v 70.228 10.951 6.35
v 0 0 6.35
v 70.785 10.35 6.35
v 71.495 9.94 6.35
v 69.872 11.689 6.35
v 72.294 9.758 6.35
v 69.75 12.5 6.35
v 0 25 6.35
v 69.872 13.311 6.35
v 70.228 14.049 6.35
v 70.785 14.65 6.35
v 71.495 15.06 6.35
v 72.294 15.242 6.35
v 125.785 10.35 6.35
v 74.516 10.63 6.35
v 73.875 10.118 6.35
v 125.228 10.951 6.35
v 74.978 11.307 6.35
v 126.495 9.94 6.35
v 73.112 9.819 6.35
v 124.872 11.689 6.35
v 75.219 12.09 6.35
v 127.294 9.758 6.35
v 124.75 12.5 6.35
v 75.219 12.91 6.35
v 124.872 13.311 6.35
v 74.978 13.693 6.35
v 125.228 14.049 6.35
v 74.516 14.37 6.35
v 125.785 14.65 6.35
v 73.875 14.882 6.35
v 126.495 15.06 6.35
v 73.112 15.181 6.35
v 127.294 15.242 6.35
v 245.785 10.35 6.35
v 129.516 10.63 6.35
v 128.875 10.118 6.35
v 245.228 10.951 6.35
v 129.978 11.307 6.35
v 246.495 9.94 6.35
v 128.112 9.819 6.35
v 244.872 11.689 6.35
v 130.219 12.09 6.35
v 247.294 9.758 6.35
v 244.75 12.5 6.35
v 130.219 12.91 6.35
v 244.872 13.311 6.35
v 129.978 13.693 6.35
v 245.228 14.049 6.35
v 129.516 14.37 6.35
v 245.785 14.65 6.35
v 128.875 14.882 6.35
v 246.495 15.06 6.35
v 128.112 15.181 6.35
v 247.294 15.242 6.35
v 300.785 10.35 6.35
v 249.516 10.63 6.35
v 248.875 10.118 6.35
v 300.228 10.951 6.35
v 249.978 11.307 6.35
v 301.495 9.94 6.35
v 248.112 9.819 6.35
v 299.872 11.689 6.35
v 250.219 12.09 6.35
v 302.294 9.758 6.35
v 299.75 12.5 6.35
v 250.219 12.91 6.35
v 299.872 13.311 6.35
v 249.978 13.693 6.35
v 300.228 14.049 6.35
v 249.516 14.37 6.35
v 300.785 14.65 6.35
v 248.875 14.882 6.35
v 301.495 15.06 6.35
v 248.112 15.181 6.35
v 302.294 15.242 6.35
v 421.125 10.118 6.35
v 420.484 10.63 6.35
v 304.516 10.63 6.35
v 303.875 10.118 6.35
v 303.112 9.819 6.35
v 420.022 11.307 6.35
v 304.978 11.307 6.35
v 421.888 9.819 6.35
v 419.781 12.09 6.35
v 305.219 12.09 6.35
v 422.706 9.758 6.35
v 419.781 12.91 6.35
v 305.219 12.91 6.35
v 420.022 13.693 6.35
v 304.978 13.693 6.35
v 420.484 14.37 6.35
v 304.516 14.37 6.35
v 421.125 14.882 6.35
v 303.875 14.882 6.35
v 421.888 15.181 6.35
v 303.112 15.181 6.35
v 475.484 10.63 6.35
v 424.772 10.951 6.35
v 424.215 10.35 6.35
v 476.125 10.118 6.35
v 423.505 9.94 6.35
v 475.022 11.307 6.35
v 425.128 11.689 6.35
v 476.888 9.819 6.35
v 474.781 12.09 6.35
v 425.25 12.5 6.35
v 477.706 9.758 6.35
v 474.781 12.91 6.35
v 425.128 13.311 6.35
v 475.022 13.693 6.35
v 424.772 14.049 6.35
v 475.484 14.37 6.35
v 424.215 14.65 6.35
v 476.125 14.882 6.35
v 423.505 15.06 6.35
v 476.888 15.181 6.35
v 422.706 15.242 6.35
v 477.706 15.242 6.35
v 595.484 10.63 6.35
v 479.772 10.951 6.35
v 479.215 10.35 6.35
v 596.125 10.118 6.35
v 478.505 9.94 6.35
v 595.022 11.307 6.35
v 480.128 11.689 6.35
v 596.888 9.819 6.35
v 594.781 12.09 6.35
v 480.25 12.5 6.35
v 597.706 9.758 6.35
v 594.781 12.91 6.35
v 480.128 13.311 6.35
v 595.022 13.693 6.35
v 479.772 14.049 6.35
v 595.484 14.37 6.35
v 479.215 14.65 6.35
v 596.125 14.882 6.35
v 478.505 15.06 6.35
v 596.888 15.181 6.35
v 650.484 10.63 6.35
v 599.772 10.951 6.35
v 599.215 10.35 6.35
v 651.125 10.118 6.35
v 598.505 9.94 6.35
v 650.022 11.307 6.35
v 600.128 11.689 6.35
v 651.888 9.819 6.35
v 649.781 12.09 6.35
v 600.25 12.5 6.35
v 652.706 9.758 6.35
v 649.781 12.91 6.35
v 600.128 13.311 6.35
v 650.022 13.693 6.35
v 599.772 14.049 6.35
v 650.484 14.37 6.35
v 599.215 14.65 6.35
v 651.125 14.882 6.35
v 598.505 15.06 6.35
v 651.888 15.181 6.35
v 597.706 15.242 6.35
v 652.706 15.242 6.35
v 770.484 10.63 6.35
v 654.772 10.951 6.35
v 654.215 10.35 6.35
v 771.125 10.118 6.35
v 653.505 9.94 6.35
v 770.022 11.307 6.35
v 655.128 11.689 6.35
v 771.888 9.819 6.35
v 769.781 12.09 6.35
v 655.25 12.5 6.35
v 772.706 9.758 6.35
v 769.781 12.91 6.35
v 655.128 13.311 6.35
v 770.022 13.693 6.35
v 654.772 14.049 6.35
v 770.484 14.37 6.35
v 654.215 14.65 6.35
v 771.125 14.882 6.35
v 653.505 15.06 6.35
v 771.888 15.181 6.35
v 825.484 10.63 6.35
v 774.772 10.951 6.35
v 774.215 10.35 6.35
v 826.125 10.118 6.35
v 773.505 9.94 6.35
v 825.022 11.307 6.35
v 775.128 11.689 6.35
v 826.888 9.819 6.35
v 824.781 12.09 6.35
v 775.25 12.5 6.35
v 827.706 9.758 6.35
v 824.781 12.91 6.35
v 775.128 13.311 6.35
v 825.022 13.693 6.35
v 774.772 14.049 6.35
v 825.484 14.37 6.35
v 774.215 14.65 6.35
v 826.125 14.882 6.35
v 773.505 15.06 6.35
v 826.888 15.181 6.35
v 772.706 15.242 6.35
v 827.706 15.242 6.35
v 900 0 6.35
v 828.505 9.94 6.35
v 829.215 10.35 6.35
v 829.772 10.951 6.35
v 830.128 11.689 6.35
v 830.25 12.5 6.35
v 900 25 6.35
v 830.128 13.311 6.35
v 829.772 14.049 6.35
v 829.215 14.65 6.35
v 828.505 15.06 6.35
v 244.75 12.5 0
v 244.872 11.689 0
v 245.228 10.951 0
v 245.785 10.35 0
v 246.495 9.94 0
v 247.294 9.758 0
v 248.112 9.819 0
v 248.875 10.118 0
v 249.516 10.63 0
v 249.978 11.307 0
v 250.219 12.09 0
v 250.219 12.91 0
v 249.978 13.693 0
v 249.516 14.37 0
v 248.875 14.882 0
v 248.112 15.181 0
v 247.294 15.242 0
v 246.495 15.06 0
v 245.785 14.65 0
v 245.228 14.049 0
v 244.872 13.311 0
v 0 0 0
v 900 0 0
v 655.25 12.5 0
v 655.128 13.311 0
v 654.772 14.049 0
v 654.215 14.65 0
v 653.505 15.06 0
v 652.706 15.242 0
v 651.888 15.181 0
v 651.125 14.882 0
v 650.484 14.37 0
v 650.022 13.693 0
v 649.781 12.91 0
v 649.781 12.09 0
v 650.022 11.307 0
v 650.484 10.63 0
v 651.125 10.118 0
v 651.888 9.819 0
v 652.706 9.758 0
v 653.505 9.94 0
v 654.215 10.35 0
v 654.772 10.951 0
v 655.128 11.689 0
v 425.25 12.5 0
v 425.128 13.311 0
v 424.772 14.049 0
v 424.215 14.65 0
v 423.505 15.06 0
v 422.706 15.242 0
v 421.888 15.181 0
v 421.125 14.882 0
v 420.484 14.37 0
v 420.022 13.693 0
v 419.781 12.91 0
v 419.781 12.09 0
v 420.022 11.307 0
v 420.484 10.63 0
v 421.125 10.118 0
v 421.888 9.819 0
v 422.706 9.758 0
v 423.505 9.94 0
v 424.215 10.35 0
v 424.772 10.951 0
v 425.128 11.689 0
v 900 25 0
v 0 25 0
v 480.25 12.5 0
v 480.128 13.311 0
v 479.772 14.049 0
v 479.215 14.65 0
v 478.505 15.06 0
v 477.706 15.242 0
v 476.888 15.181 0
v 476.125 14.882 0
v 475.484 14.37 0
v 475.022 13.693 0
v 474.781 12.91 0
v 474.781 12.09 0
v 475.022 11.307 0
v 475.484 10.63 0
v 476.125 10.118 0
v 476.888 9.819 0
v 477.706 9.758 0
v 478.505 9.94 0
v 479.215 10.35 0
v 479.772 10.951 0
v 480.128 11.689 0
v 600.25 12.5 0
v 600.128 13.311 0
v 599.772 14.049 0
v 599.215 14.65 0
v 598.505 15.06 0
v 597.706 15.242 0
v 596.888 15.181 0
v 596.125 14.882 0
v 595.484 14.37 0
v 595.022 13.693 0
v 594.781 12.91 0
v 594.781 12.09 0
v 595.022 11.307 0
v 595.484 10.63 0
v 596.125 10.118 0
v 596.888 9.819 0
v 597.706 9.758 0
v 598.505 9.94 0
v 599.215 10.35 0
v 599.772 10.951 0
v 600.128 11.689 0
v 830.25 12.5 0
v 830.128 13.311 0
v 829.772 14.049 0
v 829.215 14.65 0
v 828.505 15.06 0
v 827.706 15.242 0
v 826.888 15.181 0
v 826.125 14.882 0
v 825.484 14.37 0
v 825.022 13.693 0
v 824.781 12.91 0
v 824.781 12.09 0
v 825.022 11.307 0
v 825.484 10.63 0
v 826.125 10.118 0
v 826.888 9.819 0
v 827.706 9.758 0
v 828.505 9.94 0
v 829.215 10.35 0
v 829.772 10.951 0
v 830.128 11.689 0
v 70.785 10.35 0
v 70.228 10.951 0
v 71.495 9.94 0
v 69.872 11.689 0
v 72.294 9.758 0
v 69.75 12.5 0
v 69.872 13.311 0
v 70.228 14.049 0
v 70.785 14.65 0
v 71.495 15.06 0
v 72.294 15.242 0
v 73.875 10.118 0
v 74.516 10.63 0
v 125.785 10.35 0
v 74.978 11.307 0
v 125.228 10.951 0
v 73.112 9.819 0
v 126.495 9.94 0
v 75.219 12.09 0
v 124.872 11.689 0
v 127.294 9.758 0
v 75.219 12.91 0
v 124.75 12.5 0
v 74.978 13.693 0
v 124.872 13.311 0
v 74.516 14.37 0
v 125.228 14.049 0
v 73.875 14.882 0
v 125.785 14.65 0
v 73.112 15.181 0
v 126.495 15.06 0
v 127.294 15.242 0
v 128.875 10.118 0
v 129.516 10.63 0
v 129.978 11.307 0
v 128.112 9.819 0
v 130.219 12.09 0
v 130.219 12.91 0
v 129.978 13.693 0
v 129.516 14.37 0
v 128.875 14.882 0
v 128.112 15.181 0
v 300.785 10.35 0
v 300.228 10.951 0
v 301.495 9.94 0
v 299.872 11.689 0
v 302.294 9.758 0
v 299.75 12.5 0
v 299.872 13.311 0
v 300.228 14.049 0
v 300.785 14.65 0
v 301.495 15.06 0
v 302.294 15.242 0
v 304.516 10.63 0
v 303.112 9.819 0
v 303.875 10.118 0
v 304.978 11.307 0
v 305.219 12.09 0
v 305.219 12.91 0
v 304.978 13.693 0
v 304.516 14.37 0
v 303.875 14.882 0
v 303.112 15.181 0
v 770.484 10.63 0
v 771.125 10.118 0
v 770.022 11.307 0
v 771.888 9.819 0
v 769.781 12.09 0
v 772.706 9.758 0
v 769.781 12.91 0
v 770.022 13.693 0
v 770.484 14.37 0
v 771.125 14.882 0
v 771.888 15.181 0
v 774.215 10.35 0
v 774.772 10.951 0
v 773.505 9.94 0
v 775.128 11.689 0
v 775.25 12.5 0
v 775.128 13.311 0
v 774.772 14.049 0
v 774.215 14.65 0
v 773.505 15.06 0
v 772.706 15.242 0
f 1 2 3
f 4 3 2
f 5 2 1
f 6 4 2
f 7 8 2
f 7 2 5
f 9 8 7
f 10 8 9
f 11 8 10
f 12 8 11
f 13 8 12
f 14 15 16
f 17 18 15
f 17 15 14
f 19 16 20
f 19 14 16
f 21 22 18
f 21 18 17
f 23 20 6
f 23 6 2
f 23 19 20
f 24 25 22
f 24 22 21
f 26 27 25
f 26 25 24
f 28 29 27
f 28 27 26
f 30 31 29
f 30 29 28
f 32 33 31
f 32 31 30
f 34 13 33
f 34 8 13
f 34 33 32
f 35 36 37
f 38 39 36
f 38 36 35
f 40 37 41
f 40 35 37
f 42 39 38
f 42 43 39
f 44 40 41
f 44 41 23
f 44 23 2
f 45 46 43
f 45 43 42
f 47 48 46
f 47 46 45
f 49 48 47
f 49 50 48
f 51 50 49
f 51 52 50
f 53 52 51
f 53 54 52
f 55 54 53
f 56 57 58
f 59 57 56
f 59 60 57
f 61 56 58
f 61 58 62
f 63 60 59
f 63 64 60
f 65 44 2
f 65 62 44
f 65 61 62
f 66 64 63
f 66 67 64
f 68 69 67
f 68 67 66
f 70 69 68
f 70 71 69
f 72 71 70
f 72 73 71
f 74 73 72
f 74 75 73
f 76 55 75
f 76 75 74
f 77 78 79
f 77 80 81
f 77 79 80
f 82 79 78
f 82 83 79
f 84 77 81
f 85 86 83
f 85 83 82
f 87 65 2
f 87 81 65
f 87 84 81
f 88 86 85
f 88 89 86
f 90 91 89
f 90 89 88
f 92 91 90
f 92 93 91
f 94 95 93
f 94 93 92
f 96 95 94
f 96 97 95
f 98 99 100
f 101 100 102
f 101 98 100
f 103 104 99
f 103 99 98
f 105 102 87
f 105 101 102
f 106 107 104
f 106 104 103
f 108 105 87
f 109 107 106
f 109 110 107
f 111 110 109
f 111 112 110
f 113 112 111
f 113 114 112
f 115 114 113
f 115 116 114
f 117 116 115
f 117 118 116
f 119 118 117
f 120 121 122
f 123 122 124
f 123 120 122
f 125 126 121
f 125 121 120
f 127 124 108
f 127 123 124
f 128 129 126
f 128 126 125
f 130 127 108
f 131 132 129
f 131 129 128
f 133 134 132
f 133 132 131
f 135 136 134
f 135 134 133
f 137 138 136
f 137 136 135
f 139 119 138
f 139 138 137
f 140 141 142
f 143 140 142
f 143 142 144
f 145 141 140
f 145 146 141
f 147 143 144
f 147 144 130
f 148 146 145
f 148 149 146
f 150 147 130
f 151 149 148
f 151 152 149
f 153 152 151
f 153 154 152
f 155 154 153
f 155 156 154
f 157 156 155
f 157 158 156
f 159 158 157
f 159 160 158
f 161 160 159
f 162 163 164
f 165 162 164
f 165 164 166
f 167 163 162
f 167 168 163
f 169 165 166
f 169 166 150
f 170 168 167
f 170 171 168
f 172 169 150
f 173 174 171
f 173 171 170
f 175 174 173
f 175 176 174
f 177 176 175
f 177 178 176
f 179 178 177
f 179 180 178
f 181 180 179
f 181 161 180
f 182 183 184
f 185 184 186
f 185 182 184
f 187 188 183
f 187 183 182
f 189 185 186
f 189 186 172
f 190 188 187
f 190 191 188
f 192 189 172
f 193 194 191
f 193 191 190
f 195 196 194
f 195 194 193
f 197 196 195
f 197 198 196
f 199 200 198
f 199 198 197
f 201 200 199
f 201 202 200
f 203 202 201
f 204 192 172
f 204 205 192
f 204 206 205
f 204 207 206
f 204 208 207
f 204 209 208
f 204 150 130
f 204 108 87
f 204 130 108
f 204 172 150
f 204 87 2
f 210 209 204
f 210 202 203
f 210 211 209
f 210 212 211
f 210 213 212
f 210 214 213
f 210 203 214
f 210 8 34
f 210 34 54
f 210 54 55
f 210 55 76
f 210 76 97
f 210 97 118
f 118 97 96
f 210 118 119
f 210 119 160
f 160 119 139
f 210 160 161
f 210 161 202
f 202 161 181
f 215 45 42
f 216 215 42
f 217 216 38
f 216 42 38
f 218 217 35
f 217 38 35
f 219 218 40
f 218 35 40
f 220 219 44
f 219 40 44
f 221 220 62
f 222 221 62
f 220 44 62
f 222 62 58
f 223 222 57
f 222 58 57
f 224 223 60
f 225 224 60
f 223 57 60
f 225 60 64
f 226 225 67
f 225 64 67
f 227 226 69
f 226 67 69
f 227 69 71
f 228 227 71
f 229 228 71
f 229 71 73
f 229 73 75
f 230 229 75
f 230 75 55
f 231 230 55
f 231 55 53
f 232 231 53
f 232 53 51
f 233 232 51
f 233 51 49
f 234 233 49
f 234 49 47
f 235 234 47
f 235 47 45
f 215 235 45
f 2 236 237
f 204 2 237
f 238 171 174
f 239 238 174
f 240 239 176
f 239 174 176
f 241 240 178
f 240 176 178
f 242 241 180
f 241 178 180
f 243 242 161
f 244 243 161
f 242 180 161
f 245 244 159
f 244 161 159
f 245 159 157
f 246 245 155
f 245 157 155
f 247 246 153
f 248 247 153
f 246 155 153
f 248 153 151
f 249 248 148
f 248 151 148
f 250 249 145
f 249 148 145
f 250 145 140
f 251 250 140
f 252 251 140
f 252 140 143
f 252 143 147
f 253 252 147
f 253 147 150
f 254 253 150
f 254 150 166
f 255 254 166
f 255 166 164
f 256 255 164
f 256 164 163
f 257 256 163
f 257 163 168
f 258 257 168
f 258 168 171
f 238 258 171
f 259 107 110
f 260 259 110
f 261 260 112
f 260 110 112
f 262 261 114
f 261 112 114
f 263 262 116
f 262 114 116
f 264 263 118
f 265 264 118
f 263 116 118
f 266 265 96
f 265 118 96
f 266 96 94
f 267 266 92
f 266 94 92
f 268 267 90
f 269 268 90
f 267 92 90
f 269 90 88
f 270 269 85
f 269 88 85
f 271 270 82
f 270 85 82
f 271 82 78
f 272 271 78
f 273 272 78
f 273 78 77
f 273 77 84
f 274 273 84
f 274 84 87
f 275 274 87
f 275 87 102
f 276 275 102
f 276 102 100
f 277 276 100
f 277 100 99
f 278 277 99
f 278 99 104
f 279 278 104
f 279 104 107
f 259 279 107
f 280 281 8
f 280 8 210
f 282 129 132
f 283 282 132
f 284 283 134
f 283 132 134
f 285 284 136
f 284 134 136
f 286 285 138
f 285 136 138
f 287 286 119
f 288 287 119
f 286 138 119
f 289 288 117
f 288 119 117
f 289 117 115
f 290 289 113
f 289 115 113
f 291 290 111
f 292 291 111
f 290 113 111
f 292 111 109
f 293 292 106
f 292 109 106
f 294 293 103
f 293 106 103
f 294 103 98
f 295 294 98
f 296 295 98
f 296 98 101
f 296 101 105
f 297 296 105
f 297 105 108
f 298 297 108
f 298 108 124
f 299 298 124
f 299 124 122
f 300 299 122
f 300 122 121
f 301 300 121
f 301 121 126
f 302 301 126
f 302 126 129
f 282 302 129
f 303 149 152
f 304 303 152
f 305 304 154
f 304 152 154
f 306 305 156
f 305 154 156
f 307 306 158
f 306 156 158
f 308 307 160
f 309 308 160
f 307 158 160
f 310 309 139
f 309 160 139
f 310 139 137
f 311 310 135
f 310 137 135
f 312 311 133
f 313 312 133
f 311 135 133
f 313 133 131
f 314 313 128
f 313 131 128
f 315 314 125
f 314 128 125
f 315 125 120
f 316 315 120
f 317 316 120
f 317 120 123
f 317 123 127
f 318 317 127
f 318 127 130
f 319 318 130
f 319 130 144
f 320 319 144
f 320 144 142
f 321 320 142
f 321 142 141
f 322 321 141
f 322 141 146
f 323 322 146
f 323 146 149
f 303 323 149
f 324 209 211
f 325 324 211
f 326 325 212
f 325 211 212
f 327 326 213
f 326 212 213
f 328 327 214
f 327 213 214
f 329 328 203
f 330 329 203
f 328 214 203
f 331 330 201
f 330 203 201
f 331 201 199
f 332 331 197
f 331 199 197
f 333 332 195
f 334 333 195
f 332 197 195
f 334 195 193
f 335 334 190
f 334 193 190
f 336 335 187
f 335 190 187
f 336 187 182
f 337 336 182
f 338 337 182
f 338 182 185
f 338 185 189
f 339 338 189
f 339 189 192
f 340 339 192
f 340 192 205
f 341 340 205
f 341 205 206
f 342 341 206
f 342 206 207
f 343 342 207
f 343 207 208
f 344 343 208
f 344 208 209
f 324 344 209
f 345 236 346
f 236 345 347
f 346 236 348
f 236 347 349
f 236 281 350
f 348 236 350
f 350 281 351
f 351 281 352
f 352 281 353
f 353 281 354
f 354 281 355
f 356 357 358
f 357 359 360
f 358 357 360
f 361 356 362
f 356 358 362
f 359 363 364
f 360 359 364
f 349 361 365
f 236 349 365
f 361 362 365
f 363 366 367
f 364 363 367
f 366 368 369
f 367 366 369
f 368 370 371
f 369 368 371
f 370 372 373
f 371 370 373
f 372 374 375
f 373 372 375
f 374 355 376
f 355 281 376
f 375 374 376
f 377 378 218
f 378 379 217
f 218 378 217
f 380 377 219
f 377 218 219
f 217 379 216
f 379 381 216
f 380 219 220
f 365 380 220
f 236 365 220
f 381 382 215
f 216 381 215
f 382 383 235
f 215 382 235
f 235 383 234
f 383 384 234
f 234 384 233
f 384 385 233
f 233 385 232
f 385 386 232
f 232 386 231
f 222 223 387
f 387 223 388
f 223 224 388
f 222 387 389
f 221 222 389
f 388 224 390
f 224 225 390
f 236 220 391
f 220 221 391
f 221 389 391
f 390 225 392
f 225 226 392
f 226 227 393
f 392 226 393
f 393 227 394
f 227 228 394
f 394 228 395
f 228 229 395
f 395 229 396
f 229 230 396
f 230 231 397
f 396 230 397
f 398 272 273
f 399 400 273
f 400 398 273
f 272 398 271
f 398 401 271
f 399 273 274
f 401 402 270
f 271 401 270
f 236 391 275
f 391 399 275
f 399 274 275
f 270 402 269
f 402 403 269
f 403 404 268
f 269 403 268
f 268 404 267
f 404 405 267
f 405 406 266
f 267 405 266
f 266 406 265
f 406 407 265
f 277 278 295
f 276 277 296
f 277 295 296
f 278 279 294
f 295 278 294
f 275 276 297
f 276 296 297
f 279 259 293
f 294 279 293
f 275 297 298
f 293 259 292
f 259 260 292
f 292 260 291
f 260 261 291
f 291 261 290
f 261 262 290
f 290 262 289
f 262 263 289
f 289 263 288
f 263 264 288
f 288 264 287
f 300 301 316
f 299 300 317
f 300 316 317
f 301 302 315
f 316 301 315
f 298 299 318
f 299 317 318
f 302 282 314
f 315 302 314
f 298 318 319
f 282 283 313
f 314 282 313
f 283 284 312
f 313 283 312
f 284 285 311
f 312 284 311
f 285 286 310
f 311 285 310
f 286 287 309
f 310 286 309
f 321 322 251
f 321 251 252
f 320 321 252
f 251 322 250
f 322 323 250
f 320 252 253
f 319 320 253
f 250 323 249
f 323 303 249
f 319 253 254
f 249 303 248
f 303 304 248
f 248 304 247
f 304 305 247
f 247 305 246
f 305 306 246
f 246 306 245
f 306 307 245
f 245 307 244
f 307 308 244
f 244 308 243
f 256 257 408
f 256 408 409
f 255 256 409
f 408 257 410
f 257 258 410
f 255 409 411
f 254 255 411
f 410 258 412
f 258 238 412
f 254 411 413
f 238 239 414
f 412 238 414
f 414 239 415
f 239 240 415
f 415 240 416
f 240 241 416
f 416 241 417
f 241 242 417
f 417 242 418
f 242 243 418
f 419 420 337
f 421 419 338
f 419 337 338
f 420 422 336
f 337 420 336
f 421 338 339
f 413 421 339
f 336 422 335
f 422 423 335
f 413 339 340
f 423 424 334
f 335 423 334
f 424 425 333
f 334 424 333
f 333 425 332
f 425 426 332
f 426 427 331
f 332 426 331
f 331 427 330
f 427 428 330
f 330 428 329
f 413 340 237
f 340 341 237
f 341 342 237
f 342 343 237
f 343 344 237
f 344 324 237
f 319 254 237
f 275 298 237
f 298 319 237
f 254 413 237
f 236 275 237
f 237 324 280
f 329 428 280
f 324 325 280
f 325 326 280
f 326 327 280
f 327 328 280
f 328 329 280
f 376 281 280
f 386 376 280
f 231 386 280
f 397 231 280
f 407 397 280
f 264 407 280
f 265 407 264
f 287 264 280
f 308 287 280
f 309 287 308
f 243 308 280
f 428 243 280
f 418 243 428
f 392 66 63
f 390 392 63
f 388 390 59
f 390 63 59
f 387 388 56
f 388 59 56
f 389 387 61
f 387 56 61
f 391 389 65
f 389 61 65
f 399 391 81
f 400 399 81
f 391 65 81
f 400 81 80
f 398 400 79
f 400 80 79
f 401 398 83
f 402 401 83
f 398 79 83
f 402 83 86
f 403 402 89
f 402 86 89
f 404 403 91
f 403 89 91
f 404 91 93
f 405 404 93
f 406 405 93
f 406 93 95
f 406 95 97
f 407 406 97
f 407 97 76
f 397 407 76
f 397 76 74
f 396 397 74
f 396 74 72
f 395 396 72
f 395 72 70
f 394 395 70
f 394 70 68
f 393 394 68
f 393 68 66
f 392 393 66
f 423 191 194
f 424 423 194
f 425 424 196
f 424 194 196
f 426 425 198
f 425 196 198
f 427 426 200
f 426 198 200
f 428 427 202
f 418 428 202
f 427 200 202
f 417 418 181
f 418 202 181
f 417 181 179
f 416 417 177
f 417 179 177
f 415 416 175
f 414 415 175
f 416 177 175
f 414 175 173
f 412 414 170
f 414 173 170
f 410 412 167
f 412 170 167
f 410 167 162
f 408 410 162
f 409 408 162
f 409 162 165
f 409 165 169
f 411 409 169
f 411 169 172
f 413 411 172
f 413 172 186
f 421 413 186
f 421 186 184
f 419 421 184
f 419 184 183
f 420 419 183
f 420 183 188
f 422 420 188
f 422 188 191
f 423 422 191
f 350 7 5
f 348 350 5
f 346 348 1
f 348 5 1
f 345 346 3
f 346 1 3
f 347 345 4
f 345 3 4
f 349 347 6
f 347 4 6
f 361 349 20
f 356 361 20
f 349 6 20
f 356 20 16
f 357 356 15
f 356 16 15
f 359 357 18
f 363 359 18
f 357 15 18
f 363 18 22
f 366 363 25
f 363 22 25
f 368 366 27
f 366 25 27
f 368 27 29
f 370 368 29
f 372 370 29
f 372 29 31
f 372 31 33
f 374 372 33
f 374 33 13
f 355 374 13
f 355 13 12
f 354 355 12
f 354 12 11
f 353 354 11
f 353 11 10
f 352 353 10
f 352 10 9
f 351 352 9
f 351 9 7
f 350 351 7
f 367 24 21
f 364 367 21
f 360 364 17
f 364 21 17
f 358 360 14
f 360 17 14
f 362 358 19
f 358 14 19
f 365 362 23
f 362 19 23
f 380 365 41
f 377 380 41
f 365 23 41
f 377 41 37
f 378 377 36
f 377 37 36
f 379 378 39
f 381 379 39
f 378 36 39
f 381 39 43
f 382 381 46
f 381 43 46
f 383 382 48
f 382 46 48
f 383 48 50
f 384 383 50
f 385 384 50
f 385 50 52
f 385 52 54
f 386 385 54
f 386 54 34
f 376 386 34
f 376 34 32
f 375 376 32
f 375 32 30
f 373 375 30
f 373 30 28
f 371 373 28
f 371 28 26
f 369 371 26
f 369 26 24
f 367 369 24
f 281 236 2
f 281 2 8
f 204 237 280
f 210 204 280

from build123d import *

# Parameters (mm, degrees)
SKETCH1_W           = 900
SKETCH1_H           = 25
BOSS_EXTRUDE1_DEPTH = 6.35
CUT_EXTRUDE1_REACH  = 902.37
SKETCH2_R           = 2.75


with BuildPart() as part:
    # Sketch1 → Boss-Extrude1 (new body)
    with BuildSketch(Plane.XY):
        with Locations((450, 12.5)):
            Rectangle(SKETCH1_W, SKETCH1_H)
    extrude(amount=BOSS_EXTRUDE1_DEPTH)

    # Sketch2 → Cut-Extrude1 (cut, up to next)
    with BuildSketch(Plane.XY.offset(6.35), mode=Mode.PRIVATE) as cut_extrude1_sk1:
        with Locations((477.5, 12.5)):
            Circle(SKETCH2_R)
    cut_extrude1_tool1 = extrude(cut_extrude1_sk1.sketch, amount=-CUT_EXTRUDE1_REACH, mode=Mode.PRIVATE) & part.part
    # Sketch2 → Cut-Extrude1 (cut, up to next)
    with BuildSketch(Plane.XY.offset(6.35), mode=Mode.PRIVATE) as cut_extrude1_sk2:
        with Locations((422.5, 12.5)):
            Circle(SKETCH2_R)
    cut_extrude1_tool2 = extrude(cut_extrude1_sk2.sketch, amount=-CUT_EXTRUDE1_REACH, mode=Mode.PRIVATE) & part.part
    # Sketch2 → Cut-Extrude1 (cut, up to next)
    with BuildSketch(Plane.XY.offset(6.35), mode=Mode.PRIVATE) as cut_extrude1_sk3:
        with Locations((652.5, 12.5)):
            Circle(SKETCH2_R)
    cut_extrude1_tool3 = extrude(cut_extrude1_sk3.sketch, amount=-CUT_EXTRUDE1_REACH, mode=Mode.PRIVATE) & part.part
    # Sketch2 → Cut-Extrude1 (cut, up to next)
    with BuildSketch(Plane.XY.offset(6.35), mode=Mode.PRIVATE) as cut_extrude1_sk4:
        with Locations((597.5, 12.5)):
            Circle(SKETCH2_R)
    cut_extrude1_tool4 = extrude(cut_extrude1_sk4.sketch, amount=-CUT_EXTRUDE1_REACH, mode=Mode.PRIVATE) & part.part
    # Sketch2 → Cut-Extrude1 (cut, up to next)
    with BuildSketch(Plane.XY.offset(6.35), mode=Mode.PRIVATE) as cut_extrude1_sk5:
        with Locations((827.5, 12.5)):
            Circle(SKETCH2_R)
    cut_extrude1_tool5 = extrude(cut_extrude1_sk5.sketch, amount=-CUT_EXTRUDE1_REACH, mode=Mode.PRIVATE) & part.part
    # Sketch2 → Cut-Extrude1 (cut, up to next)
    with BuildSketch(Plane.XY.offset(6.35), mode=Mode.PRIVATE) as cut_extrude1_sk6:
        with Locations((772.5, 12.5)):
            Circle(SKETCH2_R)
    cut_extrude1_tool6 = extrude(cut_extrude1_sk6.sketch, amount=-CUT_EXTRUDE1_REACH, mode=Mode.PRIVATE) & part.part
    # Sketch2 → Cut-Extrude1 (cut, up to next)
    with BuildSketch(Plane.XY.offset(6.35), mode=Mode.PRIVATE) as cut_extrude1_sk7:
        with Locations(Location((127.5, 12.5, 0), (0, 0, 180))):
            Circle(SKETCH2_R)
    cut_extrude1_tool7 = extrude(cut_extrude1_sk7.sketch, amount=-CUT_EXTRUDE1_REACH, mode=Mode.PRIVATE) & part.part
    # Sketch2 → Cut-Extrude1 (cut, up to next)
    with BuildSketch(Plane.XY.offset(6.35), mode=Mode.PRIVATE) as cut_extrude1_sk8:
        with Locations(Location((72.5, 12.5, 0), (0, 0, 180))):
            Circle(SKETCH2_R)
    cut_extrude1_tool8 = extrude(cut_extrude1_sk8.sketch, amount=-CUT_EXTRUDE1_REACH, mode=Mode.PRIVATE) & part.part
    # Sketch2 → Cut-Extrude1 (cut, up to next)
    with BuildSketch(Plane.XY.offset(6.35), mode=Mode.PRIVATE) as cut_extrude1_sk9:
        with Locations(Location((247.5, 12.5, 0), (0, 0, 180))):
            Circle(SKETCH2_R)
    cut_extrude1_tool9 = extrude(cut_extrude1_sk9.sketch, amount=-CUT_EXTRUDE1_REACH, mode=Mode.PRIVATE) & part.part
    # Sketch2 → Cut-Extrude1 (cut, up to next)
    with BuildSketch(Plane.XY.offset(6.35), mode=Mode.PRIVATE) as cut_extrude1_sk10:
        with Locations(Location((302.5, 12.5, 0), (0, 0, 180))):
            Circle(SKETCH2_R)
    cut_extrude1_tool10 = extrude(cut_extrude1_sk10.sketch, amount=-CUT_EXTRUDE1_REACH, mode=Mode.PRIVATE) & part.part
    add(cut_extrude1_tool1.solids().sort_by_distance((477.5, 12.5, 6.35))[0], mode=Mode.SUBTRACT)
    add(cut_extrude1_tool2.solids().sort_by_distance((422.5, 12.5, 6.35))[0], mode=Mode.SUBTRACT)
    add(cut_extrude1_tool3.solids().sort_by_distance((652.5, 12.5, 6.35))[0], mode=Mode.SUBTRACT)
    add(cut_extrude1_tool4.solids().sort_by_distance((597.5, 12.5, 6.35))[0], mode=Mode.SUBTRACT)
    add(cut_extrude1_tool5.solids().sort_by_distance((827.5, 12.5, 6.35))[0], mode=Mode.SUBTRACT)
    add(cut_extrude1_tool6.solids().sort_by_distance((772.5, 12.5, 6.35))[0], mode=Mode.SUBTRACT)
    add(cut_extrude1_tool7.solids().sort_by_distance((127.5, 12.5, 6.35))[0], mode=Mode.SUBTRACT)
    add(cut_extrude1_tool8.solids().sort_by_distance((72.5, 12.5, 6.35))[0], mode=Mode.SUBTRACT)
    add(cut_extrude1_tool9.solids().sort_by_distance((247.5, 12.5, 6.35))[0], mode=Mode.SUBTRACT)
    add(cut_extrude1_tool10.solids().sort_by_distance((302.5, 12.5, 6.35))[0], mode=Mode.SUBTRACT)


solid = part.part
